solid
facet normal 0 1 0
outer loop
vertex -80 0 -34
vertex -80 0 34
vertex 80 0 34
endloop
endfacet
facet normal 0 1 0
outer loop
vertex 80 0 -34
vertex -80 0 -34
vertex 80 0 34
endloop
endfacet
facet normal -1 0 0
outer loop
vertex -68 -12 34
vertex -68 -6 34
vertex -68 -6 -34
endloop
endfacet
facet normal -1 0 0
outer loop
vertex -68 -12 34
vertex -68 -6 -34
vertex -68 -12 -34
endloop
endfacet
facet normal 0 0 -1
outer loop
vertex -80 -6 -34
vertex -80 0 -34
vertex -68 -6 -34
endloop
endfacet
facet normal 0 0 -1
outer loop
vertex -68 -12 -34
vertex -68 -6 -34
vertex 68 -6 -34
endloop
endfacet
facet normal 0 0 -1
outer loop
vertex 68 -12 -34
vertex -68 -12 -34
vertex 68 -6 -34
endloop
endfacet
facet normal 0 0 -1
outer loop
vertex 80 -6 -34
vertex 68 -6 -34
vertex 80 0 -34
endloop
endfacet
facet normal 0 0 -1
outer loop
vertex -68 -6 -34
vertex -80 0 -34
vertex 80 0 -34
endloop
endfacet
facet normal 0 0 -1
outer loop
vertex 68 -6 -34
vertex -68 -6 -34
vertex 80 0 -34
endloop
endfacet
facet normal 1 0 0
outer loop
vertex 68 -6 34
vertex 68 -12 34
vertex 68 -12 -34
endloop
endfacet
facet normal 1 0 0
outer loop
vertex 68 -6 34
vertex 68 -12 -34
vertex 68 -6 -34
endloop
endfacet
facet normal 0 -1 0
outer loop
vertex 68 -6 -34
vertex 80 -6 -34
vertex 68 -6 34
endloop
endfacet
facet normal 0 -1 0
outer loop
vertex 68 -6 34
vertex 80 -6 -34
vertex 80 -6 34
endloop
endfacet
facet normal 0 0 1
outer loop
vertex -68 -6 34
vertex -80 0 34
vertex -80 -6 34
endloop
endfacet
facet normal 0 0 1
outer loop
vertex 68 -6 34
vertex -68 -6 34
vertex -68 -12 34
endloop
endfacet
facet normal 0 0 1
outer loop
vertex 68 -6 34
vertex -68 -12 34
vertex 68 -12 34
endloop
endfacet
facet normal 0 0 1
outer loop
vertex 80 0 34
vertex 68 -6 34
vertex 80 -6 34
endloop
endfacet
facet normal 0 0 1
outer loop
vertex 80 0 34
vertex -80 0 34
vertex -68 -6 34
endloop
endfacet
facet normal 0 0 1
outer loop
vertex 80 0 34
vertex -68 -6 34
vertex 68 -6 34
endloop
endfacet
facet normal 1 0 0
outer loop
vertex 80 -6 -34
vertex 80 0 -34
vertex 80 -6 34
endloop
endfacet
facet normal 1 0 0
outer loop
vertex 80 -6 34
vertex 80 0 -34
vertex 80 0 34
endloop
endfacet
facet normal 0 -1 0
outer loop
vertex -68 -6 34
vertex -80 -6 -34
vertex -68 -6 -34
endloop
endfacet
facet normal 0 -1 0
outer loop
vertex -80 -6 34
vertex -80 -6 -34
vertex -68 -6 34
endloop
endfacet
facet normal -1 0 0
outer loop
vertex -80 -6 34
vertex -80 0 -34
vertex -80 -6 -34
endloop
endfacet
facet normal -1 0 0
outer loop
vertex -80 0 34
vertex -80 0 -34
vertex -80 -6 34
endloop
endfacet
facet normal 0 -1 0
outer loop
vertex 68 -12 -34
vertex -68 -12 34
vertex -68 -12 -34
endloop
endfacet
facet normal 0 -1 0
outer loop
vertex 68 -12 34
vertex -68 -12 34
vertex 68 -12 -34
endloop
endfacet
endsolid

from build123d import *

# Parameters (mm, degrees)
F0_W     = 160
F0_H     = 68
F1_DEPTH = 12
F3_DEPTH = 12
F4_W     = 6
F4_H     = 68
F5_DEPTH = 12


with BuildPart() as f1:
    # F0 (on Front) → F1 (new body)
    with BuildSketch(Plane.XZ):
        Rectangle(F0_W, F0_H)
    extrude(amount=F1_DEPTH)

    # F2 (on face) → F3 (cut)
    with BuildSketch(Plane.YZ.offset(80)):
        Polygon((-6, 22), (-6, 34), (-12, 34), (-12, -34), (-6, -34), align=None)
    extrude(amount=-F3_DEPTH, mode=Mode.SUBTRACT)

    # F4 (on face) → F5 (cut)
    with BuildSketch(Plane(origin=(-80, 0, 0), x_dir=(0, -1, 0), z_dir=(-1, 0, 0))):
        with Locations((9, 0)):
            Rectangle(F4_W, F4_H)
    extrude(amount=-F5_DEPTH, mode=Mode.SUBTRACT)


solid = f1.part
